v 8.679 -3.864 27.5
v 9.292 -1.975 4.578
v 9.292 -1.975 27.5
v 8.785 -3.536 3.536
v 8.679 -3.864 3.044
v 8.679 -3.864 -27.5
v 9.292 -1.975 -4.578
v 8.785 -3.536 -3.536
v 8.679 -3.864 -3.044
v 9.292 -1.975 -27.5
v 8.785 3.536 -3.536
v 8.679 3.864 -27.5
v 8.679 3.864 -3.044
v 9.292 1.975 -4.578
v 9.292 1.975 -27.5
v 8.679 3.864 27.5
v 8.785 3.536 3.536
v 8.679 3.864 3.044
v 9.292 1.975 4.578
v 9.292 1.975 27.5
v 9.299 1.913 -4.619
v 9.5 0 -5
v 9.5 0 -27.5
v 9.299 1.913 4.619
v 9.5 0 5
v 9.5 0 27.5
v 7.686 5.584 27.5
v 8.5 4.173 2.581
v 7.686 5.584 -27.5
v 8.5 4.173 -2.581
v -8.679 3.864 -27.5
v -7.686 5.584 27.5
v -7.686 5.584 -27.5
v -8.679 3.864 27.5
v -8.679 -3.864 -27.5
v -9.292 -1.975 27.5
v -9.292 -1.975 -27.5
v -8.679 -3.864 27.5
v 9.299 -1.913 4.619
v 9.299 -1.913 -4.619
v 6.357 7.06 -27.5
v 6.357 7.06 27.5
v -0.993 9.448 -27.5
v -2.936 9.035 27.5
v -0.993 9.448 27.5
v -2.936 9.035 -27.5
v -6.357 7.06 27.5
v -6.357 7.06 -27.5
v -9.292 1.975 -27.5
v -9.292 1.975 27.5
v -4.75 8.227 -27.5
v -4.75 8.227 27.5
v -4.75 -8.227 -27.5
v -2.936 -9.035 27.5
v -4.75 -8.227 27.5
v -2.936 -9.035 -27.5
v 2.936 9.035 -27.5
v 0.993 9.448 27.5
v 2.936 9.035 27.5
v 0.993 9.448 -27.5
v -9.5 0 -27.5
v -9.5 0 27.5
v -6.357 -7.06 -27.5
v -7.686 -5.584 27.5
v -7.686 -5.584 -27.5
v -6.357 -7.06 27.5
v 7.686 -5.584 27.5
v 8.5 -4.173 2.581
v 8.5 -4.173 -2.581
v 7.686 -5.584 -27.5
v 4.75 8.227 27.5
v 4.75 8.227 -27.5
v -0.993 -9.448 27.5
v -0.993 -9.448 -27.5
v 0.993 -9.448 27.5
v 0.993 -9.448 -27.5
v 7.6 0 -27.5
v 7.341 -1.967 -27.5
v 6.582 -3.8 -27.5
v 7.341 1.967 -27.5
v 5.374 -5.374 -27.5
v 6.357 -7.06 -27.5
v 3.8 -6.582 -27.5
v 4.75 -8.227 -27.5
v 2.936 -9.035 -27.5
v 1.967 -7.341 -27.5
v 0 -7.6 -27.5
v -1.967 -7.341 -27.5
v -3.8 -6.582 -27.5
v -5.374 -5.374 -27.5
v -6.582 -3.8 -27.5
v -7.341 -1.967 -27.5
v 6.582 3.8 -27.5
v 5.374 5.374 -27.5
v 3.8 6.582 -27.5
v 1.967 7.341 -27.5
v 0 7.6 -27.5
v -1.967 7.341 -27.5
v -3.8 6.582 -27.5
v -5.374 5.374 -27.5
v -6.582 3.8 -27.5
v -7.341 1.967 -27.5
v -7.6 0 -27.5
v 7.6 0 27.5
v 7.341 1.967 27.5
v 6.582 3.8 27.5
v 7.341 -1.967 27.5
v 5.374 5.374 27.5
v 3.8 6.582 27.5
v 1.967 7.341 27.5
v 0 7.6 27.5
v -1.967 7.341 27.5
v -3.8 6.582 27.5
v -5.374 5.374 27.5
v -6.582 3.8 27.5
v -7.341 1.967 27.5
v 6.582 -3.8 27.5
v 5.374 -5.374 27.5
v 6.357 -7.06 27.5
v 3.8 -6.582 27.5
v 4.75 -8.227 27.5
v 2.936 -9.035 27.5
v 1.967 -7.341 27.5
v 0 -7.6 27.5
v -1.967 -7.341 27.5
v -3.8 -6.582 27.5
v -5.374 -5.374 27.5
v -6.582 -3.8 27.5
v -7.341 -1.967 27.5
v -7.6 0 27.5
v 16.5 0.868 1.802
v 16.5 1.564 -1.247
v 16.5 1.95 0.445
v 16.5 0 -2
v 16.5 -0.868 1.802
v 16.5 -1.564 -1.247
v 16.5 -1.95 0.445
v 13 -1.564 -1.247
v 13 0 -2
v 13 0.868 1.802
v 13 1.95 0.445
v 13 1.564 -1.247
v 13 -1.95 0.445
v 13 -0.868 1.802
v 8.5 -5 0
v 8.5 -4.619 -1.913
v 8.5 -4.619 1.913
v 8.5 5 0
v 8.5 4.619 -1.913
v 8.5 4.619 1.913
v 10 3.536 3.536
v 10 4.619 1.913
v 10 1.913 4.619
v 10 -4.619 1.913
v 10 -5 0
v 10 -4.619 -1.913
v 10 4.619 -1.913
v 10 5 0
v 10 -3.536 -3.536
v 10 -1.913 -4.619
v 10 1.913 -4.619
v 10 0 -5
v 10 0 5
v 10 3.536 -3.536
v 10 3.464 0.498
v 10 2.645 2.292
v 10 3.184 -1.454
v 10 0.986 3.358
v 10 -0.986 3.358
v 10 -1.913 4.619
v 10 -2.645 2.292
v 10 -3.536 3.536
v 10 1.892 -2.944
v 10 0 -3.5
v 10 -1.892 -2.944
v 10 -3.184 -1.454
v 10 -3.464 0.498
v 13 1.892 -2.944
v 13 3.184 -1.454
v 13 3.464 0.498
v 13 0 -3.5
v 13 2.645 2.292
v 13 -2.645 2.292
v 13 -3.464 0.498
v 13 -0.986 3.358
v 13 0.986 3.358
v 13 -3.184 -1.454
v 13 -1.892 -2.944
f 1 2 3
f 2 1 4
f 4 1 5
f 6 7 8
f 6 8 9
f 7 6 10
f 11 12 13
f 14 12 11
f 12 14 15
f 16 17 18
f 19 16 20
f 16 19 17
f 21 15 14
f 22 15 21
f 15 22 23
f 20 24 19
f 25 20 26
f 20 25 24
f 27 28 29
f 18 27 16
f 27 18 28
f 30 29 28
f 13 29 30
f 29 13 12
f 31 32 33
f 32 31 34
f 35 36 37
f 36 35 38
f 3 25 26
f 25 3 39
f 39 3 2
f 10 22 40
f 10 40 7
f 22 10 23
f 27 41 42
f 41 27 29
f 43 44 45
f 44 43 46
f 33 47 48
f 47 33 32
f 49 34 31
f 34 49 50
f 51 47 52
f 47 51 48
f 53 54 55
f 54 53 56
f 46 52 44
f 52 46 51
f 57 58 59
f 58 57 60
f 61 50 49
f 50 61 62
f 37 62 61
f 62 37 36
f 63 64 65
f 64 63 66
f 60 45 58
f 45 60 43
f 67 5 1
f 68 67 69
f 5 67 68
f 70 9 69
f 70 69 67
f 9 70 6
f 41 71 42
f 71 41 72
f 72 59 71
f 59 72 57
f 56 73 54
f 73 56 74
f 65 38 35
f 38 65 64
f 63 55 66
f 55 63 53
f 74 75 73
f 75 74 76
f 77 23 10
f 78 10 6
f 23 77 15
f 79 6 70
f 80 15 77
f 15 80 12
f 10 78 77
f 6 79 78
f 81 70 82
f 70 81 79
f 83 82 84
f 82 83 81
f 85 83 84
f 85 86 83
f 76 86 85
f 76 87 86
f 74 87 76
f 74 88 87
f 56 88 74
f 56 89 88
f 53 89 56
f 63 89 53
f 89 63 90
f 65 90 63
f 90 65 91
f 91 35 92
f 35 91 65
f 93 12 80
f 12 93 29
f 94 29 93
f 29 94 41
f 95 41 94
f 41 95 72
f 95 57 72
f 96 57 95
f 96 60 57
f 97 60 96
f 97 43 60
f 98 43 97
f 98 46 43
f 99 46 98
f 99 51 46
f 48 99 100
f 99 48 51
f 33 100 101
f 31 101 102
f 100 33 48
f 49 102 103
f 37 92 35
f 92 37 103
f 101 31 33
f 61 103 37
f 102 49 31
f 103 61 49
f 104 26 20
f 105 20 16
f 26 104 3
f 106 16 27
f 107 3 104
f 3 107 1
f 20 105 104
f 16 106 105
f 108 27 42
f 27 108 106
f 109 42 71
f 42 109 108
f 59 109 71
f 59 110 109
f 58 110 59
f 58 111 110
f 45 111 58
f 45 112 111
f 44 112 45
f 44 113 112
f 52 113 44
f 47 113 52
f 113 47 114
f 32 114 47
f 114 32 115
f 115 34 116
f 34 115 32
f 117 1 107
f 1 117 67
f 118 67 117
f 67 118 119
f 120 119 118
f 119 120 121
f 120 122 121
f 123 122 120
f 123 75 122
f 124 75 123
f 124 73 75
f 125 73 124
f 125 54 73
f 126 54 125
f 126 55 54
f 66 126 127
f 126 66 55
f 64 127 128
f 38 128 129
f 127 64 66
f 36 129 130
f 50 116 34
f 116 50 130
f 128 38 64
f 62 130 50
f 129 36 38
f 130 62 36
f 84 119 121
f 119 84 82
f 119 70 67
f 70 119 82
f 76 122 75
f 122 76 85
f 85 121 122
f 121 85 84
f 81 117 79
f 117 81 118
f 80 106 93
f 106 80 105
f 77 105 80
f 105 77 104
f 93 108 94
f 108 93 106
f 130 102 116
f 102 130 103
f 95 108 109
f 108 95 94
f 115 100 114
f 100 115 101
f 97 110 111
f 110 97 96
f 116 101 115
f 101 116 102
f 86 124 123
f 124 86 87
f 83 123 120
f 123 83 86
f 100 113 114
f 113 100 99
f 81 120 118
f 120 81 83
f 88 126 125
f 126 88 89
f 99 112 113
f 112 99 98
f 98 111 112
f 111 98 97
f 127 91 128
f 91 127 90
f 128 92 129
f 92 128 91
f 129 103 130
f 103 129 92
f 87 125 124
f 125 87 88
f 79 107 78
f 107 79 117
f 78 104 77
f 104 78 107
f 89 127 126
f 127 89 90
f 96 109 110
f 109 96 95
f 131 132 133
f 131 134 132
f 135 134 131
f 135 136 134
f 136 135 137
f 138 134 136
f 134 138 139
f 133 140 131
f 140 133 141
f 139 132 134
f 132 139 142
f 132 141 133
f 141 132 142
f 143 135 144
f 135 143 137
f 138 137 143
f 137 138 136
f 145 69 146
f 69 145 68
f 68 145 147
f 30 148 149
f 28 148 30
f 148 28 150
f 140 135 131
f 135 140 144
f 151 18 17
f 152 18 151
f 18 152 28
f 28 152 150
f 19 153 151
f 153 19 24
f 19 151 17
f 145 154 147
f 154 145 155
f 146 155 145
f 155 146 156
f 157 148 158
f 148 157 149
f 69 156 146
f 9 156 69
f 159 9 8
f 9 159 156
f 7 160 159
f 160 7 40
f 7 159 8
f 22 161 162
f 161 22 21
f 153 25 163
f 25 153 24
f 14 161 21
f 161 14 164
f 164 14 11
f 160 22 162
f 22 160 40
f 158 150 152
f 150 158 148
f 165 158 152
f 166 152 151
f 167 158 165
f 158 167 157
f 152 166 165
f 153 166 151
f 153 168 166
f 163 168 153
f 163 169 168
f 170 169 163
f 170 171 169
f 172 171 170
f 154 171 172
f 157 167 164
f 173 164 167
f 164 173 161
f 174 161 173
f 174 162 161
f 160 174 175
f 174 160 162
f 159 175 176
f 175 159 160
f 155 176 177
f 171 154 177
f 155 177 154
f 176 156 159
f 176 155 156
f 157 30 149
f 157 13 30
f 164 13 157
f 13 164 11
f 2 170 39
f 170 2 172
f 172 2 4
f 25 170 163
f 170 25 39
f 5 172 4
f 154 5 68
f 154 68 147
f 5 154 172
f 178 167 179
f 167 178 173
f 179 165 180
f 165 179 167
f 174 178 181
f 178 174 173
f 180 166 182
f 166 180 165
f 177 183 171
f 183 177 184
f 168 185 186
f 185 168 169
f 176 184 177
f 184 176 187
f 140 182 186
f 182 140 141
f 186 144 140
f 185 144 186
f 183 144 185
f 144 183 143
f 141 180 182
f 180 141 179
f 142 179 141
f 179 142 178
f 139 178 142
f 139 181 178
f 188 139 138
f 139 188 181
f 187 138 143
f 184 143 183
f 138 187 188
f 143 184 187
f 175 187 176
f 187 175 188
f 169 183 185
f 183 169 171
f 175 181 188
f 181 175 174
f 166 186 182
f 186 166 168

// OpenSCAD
// Parameters
bore_diameter_mm = 10; //[5:20:0.5]
outer_diameter_mm = 19; //[10:38:0.5]
length_mm = 55; //[30:110:1]
casing_thickness_mm = 1.9; //[0.8:4:0.1]
overlap_mm = 1; //[0.5:2:0.1]
screw_shank_diameter_mm = 4; //[2:8:0.5]
screw_head_diameter_mm = 7; //[4:14:0.5]
screw_head_height_mm = 3; //[1.5:6:0.5]
washer_outer_diameter_mm = 10; //[6:20:0.5]
washer_thickness_mm = 1.5; //[0.8:3:0.1]
screw_shank_length_mm = 8; //[4:20:1]

// Linear Bearing - complete geometry
module linear_bearing() {
  color("DimGray") {
    difference() {
      // Outer casing
      cylinder(r=outer_diameter_mm/2, h=length_mm, center=true);
      // Inner casing cut
      cylinder(r=outer_diameter_mm/2 - casing_thickness_mm, h=length_mm + 2*overlap_mm, center=true);
      // Inner bore cut
      cylinder(r=bore_diameter_mm/2, h=length_mm + 2*overlap_mm, center=true);
    }
  }
}

// Screw and Washer - complete geometry
module screw_and_washer() {
  color("Silver") {
    union() {
      // Screw shank
      translate([outer_diameter_mm/2 + screw_shank_length_mm/2 - overlap_mm, 0, 0])
        rotate([0, 90, 0])
        cylinder(r=screw_shank_diameter_mm/2, h=screw_shank_length_mm, center=true);
      // Washer
      translate([outer_diameter_mm/2 + washer_thickness_mm/2 - overlap_mm, 0, 0])
        rotate([0, 90, 0])
        cylinder(r=washer_outer_diameter_mm/2, h=washer_thickness_mm, center=true);
      // Screw head
      translate([outer_diameter_mm/2 + washer_thickness_mm - overlap_mm + screw_head_height_mm/2, 0, 0])
        rotate([0, 90, 0])
        cylinder(r=screw_head_diameter_mm/2, h=screw_head_height_mm, center=true);
    }
  }
}

// Assembly
module assembly() {
  linear_bearing();
  screw_and_washer();
}

assembly();
